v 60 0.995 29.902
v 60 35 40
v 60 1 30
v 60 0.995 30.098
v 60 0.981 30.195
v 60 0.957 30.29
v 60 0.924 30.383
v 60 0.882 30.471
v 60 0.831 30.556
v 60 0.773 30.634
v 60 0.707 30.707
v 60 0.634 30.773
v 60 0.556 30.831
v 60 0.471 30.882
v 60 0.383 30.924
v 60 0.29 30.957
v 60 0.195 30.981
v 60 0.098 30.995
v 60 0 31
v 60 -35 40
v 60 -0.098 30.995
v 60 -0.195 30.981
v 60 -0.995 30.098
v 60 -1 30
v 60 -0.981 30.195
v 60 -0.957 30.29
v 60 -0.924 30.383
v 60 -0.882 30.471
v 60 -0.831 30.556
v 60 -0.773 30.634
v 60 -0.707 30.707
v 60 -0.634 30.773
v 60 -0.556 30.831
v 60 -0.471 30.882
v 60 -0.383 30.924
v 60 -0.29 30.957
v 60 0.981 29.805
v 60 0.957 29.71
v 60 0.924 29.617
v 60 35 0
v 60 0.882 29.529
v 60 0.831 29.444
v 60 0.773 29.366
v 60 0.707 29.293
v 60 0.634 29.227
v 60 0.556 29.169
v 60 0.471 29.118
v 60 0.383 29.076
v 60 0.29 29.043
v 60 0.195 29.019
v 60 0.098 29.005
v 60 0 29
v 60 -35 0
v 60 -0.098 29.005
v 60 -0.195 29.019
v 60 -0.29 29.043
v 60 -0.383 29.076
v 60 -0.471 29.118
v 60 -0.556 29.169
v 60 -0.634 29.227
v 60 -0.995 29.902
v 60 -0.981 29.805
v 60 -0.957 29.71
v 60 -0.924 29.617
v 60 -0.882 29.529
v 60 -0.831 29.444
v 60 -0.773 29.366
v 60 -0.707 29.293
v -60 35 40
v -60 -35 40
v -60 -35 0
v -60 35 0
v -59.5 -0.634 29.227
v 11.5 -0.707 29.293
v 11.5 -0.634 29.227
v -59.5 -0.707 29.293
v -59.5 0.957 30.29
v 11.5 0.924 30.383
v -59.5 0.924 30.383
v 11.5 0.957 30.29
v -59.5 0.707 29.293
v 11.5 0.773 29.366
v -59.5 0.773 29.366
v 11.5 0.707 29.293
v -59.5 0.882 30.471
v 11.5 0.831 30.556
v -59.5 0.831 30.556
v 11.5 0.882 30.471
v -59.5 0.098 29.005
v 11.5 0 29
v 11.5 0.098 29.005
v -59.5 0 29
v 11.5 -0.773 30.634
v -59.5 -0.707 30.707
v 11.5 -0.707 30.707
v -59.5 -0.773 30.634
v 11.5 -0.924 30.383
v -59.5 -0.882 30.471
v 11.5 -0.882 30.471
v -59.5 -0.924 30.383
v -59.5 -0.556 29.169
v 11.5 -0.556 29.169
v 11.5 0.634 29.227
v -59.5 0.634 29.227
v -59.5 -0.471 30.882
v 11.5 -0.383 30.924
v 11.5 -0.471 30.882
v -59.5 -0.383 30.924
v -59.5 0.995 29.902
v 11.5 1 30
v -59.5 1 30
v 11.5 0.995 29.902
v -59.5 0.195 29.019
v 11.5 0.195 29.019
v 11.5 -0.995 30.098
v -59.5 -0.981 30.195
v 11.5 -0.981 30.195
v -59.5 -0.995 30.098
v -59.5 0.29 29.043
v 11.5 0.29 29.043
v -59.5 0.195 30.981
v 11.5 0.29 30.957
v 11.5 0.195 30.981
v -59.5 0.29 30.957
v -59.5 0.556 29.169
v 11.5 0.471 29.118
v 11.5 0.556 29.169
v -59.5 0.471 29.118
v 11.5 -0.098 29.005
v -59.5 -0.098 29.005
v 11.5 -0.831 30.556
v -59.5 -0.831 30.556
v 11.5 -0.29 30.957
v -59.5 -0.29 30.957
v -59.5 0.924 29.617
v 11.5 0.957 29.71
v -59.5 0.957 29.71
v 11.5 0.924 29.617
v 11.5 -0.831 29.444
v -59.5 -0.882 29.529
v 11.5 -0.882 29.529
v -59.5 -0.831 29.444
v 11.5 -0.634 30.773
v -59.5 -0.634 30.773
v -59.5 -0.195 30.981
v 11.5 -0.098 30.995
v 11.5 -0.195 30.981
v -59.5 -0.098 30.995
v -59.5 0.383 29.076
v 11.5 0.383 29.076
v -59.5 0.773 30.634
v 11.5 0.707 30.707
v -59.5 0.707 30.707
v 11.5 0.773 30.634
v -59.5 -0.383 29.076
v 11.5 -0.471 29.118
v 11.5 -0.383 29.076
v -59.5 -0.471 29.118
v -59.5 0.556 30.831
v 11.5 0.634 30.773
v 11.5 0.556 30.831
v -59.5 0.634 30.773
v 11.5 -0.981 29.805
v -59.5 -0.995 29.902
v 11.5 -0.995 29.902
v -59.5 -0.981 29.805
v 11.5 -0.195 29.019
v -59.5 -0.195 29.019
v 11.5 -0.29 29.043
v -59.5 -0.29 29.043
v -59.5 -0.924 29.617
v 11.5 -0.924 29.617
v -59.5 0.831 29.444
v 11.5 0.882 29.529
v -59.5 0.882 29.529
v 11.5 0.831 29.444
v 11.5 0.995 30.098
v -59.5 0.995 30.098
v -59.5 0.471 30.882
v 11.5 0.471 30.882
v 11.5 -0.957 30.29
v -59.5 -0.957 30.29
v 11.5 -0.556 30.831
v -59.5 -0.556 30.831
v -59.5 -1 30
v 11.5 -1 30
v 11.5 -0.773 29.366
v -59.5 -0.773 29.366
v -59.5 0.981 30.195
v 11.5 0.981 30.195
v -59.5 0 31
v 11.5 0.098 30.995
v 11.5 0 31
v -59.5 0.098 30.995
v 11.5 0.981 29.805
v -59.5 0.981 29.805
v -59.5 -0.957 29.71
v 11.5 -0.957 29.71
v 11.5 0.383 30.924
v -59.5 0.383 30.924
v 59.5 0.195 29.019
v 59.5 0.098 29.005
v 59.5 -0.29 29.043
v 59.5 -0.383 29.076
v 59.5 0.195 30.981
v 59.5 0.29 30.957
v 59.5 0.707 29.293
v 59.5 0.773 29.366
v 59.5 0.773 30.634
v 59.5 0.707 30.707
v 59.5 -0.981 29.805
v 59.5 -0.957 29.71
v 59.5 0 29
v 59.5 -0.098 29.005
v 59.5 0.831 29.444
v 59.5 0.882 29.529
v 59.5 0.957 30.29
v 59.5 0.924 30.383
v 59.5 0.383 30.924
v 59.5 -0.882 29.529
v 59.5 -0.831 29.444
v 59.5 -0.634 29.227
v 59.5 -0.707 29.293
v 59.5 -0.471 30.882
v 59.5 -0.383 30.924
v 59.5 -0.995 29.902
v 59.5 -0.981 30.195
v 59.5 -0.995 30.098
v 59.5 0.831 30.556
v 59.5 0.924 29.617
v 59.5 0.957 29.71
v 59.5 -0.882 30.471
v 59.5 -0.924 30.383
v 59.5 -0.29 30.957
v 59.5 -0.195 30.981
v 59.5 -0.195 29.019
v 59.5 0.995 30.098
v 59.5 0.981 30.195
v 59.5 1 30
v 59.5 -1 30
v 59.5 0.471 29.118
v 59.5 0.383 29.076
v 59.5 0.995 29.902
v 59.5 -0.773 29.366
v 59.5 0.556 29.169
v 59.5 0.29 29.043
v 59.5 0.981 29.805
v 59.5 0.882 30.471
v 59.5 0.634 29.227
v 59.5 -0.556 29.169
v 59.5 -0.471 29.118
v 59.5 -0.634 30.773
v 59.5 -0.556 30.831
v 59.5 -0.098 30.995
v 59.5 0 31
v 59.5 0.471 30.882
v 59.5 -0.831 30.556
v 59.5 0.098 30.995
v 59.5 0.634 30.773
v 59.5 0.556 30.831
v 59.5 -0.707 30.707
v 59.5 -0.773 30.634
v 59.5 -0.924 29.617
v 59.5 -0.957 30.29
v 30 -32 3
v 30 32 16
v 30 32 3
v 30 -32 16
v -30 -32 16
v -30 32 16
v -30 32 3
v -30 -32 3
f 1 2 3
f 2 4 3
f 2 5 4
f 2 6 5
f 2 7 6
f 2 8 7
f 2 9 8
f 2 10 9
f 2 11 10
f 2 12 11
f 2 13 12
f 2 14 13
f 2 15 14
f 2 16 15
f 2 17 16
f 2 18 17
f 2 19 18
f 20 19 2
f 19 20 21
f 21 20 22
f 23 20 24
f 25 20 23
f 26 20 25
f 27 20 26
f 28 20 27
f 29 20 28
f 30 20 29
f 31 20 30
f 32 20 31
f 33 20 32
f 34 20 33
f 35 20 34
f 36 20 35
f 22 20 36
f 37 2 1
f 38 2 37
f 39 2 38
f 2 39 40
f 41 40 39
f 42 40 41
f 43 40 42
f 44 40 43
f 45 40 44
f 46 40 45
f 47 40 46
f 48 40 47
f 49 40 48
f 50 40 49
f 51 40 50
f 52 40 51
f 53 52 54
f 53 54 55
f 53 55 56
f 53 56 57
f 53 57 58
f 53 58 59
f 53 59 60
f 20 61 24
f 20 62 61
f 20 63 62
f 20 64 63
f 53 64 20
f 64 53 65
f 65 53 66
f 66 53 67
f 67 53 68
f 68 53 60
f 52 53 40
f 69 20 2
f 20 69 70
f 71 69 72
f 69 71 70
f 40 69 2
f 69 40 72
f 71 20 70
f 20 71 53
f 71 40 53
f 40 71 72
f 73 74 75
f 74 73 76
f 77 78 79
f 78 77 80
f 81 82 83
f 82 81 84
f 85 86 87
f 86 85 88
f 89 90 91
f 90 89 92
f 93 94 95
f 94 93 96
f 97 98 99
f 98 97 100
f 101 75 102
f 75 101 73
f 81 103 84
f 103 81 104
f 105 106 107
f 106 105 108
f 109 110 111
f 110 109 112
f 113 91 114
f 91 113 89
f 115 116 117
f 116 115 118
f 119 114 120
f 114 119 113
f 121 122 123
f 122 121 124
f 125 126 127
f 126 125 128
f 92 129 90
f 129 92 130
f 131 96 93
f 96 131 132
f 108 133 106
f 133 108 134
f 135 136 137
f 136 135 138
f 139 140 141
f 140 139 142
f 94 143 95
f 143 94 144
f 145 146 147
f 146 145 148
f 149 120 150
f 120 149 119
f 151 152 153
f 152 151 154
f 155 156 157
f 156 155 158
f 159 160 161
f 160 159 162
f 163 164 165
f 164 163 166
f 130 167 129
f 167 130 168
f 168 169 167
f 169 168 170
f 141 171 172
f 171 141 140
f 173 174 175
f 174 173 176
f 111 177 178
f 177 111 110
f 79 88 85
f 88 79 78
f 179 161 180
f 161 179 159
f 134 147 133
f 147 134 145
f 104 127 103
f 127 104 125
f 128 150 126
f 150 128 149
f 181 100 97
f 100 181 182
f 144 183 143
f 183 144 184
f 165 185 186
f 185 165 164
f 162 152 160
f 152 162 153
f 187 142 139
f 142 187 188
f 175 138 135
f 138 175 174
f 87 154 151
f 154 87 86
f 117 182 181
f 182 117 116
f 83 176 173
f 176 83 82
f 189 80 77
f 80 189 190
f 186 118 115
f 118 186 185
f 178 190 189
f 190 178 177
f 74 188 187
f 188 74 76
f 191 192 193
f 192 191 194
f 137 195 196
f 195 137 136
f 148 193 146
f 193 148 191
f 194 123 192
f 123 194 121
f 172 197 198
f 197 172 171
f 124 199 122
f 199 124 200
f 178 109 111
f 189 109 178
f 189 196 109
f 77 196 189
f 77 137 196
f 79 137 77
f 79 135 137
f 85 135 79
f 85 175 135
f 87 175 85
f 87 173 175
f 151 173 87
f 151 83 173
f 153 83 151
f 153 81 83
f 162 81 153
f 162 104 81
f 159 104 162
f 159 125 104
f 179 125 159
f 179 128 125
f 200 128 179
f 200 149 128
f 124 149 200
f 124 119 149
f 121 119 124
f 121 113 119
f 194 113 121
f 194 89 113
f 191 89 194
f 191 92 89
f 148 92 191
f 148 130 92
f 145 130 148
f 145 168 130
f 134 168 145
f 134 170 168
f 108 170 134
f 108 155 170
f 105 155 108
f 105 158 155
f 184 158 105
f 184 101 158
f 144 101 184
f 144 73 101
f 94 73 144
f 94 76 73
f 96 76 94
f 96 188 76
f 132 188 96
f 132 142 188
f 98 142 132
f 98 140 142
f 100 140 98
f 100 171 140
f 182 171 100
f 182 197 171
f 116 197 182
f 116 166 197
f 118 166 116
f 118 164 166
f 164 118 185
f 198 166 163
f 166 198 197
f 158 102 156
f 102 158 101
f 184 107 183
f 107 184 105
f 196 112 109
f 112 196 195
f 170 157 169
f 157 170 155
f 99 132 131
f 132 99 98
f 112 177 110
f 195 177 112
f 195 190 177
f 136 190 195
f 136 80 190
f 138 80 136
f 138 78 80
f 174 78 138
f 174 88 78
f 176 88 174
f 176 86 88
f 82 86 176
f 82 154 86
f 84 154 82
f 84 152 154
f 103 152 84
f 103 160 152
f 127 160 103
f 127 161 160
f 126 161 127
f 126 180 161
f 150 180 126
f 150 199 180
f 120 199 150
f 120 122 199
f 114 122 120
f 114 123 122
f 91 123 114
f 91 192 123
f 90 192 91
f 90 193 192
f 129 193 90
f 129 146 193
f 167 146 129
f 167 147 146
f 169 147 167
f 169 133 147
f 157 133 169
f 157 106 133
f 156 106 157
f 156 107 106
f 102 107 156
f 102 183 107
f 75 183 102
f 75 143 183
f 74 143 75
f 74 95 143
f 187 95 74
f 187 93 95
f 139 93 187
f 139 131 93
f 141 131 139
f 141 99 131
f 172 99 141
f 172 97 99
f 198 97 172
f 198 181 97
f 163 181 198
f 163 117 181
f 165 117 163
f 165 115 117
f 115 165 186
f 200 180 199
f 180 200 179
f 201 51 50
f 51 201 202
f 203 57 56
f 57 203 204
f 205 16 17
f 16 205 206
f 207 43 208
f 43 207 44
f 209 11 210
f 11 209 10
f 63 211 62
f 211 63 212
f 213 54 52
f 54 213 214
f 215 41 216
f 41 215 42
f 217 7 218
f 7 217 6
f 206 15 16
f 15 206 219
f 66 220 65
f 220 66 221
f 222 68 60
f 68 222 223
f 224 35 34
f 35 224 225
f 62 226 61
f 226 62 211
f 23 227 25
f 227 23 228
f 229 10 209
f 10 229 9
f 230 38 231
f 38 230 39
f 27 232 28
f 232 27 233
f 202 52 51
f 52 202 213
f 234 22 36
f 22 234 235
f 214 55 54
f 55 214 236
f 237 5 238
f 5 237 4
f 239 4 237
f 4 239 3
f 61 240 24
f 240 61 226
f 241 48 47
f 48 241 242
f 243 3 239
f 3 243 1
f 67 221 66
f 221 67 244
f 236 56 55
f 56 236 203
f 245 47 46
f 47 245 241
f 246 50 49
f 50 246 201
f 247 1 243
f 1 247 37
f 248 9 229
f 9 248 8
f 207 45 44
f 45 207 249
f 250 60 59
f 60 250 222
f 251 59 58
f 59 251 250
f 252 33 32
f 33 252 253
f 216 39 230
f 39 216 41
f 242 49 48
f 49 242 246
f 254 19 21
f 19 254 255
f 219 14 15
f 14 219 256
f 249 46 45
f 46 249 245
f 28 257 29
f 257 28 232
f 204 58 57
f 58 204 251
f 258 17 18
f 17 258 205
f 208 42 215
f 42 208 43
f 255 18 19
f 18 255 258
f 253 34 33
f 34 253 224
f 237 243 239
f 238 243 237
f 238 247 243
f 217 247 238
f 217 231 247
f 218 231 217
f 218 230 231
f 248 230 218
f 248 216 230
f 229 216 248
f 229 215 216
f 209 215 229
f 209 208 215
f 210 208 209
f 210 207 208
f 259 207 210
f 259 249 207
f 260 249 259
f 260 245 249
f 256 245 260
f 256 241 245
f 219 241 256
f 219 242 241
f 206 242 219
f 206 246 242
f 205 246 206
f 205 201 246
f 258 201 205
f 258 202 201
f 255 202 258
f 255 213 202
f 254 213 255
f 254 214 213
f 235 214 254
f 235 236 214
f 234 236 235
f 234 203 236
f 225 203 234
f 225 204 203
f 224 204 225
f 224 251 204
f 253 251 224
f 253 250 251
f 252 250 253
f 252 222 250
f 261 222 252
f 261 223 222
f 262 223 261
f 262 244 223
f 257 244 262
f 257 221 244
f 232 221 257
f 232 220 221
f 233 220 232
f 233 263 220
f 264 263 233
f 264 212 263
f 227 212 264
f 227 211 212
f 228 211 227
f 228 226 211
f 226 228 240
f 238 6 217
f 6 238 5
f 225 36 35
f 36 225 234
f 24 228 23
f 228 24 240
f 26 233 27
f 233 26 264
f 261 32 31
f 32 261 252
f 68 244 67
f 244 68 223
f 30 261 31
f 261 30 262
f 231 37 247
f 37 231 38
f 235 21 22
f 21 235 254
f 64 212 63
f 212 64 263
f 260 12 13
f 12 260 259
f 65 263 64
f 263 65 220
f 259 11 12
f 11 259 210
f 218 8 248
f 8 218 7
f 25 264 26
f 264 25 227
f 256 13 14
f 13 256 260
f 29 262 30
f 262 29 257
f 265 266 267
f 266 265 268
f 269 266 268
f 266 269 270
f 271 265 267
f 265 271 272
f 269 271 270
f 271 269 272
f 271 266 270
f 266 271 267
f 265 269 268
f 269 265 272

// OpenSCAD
// Mini horizontal gel-electrophoresis buffer tank
// Print orientation: base on XY plane, open top facing +Z

$fn = 64;

// ---- Tank dimensions ----
tank_x = 120;   // outer length (X)
tank_y = 70;    // outer width (Y)
tank_z = 40;    // outer height (Z)

// ---- Walls ----
wall = 3;       // wall thickness
floor = 3;      // floor thickness

// ---- Platform ----
plat_len   = 60;   // platform length in X
plat_top_z = 13;   // platform top height (floor + 10)
plat_w     = tank_y - 2*wall; // inner width = full width minus side walls

// ---- Holes ----
hole_d = 2;     // electrode hole diameter
hole_y = 0;     // hole Y position
hole_z = 30;    // hole Z position

// ---- Cutting overlap ----
eps = 0.5;      // extension past cut faces

difference() {
    // Tank body
    union() {
        // Side walls (include top flange for open top)
        translate([-tank_x/2, -tank_y/2, floor])
            cube([tank_x, tank_y, tank_z - floor]);
        // Floor
        translate([-tank_x/2, -tank_y/2, 0])
            cube([tank_x, tank_y, floor]);
    }

    // Central raised platform
    translate([-plat_len/2, -plat_w/2, floor])
        cube([plat_len, plat_w, plat_top_z]);

    // Electrode holes through end walls
    for (sx = [-1, 1])
        translate([sx > 0 ? tank_x/2 - eps : -tank_x/2 + eps, hole_y, hole_z])
            rotate([0, 90, 0])
                cylinder(d = hole_d, h = tank_y + 2*eps);
}
